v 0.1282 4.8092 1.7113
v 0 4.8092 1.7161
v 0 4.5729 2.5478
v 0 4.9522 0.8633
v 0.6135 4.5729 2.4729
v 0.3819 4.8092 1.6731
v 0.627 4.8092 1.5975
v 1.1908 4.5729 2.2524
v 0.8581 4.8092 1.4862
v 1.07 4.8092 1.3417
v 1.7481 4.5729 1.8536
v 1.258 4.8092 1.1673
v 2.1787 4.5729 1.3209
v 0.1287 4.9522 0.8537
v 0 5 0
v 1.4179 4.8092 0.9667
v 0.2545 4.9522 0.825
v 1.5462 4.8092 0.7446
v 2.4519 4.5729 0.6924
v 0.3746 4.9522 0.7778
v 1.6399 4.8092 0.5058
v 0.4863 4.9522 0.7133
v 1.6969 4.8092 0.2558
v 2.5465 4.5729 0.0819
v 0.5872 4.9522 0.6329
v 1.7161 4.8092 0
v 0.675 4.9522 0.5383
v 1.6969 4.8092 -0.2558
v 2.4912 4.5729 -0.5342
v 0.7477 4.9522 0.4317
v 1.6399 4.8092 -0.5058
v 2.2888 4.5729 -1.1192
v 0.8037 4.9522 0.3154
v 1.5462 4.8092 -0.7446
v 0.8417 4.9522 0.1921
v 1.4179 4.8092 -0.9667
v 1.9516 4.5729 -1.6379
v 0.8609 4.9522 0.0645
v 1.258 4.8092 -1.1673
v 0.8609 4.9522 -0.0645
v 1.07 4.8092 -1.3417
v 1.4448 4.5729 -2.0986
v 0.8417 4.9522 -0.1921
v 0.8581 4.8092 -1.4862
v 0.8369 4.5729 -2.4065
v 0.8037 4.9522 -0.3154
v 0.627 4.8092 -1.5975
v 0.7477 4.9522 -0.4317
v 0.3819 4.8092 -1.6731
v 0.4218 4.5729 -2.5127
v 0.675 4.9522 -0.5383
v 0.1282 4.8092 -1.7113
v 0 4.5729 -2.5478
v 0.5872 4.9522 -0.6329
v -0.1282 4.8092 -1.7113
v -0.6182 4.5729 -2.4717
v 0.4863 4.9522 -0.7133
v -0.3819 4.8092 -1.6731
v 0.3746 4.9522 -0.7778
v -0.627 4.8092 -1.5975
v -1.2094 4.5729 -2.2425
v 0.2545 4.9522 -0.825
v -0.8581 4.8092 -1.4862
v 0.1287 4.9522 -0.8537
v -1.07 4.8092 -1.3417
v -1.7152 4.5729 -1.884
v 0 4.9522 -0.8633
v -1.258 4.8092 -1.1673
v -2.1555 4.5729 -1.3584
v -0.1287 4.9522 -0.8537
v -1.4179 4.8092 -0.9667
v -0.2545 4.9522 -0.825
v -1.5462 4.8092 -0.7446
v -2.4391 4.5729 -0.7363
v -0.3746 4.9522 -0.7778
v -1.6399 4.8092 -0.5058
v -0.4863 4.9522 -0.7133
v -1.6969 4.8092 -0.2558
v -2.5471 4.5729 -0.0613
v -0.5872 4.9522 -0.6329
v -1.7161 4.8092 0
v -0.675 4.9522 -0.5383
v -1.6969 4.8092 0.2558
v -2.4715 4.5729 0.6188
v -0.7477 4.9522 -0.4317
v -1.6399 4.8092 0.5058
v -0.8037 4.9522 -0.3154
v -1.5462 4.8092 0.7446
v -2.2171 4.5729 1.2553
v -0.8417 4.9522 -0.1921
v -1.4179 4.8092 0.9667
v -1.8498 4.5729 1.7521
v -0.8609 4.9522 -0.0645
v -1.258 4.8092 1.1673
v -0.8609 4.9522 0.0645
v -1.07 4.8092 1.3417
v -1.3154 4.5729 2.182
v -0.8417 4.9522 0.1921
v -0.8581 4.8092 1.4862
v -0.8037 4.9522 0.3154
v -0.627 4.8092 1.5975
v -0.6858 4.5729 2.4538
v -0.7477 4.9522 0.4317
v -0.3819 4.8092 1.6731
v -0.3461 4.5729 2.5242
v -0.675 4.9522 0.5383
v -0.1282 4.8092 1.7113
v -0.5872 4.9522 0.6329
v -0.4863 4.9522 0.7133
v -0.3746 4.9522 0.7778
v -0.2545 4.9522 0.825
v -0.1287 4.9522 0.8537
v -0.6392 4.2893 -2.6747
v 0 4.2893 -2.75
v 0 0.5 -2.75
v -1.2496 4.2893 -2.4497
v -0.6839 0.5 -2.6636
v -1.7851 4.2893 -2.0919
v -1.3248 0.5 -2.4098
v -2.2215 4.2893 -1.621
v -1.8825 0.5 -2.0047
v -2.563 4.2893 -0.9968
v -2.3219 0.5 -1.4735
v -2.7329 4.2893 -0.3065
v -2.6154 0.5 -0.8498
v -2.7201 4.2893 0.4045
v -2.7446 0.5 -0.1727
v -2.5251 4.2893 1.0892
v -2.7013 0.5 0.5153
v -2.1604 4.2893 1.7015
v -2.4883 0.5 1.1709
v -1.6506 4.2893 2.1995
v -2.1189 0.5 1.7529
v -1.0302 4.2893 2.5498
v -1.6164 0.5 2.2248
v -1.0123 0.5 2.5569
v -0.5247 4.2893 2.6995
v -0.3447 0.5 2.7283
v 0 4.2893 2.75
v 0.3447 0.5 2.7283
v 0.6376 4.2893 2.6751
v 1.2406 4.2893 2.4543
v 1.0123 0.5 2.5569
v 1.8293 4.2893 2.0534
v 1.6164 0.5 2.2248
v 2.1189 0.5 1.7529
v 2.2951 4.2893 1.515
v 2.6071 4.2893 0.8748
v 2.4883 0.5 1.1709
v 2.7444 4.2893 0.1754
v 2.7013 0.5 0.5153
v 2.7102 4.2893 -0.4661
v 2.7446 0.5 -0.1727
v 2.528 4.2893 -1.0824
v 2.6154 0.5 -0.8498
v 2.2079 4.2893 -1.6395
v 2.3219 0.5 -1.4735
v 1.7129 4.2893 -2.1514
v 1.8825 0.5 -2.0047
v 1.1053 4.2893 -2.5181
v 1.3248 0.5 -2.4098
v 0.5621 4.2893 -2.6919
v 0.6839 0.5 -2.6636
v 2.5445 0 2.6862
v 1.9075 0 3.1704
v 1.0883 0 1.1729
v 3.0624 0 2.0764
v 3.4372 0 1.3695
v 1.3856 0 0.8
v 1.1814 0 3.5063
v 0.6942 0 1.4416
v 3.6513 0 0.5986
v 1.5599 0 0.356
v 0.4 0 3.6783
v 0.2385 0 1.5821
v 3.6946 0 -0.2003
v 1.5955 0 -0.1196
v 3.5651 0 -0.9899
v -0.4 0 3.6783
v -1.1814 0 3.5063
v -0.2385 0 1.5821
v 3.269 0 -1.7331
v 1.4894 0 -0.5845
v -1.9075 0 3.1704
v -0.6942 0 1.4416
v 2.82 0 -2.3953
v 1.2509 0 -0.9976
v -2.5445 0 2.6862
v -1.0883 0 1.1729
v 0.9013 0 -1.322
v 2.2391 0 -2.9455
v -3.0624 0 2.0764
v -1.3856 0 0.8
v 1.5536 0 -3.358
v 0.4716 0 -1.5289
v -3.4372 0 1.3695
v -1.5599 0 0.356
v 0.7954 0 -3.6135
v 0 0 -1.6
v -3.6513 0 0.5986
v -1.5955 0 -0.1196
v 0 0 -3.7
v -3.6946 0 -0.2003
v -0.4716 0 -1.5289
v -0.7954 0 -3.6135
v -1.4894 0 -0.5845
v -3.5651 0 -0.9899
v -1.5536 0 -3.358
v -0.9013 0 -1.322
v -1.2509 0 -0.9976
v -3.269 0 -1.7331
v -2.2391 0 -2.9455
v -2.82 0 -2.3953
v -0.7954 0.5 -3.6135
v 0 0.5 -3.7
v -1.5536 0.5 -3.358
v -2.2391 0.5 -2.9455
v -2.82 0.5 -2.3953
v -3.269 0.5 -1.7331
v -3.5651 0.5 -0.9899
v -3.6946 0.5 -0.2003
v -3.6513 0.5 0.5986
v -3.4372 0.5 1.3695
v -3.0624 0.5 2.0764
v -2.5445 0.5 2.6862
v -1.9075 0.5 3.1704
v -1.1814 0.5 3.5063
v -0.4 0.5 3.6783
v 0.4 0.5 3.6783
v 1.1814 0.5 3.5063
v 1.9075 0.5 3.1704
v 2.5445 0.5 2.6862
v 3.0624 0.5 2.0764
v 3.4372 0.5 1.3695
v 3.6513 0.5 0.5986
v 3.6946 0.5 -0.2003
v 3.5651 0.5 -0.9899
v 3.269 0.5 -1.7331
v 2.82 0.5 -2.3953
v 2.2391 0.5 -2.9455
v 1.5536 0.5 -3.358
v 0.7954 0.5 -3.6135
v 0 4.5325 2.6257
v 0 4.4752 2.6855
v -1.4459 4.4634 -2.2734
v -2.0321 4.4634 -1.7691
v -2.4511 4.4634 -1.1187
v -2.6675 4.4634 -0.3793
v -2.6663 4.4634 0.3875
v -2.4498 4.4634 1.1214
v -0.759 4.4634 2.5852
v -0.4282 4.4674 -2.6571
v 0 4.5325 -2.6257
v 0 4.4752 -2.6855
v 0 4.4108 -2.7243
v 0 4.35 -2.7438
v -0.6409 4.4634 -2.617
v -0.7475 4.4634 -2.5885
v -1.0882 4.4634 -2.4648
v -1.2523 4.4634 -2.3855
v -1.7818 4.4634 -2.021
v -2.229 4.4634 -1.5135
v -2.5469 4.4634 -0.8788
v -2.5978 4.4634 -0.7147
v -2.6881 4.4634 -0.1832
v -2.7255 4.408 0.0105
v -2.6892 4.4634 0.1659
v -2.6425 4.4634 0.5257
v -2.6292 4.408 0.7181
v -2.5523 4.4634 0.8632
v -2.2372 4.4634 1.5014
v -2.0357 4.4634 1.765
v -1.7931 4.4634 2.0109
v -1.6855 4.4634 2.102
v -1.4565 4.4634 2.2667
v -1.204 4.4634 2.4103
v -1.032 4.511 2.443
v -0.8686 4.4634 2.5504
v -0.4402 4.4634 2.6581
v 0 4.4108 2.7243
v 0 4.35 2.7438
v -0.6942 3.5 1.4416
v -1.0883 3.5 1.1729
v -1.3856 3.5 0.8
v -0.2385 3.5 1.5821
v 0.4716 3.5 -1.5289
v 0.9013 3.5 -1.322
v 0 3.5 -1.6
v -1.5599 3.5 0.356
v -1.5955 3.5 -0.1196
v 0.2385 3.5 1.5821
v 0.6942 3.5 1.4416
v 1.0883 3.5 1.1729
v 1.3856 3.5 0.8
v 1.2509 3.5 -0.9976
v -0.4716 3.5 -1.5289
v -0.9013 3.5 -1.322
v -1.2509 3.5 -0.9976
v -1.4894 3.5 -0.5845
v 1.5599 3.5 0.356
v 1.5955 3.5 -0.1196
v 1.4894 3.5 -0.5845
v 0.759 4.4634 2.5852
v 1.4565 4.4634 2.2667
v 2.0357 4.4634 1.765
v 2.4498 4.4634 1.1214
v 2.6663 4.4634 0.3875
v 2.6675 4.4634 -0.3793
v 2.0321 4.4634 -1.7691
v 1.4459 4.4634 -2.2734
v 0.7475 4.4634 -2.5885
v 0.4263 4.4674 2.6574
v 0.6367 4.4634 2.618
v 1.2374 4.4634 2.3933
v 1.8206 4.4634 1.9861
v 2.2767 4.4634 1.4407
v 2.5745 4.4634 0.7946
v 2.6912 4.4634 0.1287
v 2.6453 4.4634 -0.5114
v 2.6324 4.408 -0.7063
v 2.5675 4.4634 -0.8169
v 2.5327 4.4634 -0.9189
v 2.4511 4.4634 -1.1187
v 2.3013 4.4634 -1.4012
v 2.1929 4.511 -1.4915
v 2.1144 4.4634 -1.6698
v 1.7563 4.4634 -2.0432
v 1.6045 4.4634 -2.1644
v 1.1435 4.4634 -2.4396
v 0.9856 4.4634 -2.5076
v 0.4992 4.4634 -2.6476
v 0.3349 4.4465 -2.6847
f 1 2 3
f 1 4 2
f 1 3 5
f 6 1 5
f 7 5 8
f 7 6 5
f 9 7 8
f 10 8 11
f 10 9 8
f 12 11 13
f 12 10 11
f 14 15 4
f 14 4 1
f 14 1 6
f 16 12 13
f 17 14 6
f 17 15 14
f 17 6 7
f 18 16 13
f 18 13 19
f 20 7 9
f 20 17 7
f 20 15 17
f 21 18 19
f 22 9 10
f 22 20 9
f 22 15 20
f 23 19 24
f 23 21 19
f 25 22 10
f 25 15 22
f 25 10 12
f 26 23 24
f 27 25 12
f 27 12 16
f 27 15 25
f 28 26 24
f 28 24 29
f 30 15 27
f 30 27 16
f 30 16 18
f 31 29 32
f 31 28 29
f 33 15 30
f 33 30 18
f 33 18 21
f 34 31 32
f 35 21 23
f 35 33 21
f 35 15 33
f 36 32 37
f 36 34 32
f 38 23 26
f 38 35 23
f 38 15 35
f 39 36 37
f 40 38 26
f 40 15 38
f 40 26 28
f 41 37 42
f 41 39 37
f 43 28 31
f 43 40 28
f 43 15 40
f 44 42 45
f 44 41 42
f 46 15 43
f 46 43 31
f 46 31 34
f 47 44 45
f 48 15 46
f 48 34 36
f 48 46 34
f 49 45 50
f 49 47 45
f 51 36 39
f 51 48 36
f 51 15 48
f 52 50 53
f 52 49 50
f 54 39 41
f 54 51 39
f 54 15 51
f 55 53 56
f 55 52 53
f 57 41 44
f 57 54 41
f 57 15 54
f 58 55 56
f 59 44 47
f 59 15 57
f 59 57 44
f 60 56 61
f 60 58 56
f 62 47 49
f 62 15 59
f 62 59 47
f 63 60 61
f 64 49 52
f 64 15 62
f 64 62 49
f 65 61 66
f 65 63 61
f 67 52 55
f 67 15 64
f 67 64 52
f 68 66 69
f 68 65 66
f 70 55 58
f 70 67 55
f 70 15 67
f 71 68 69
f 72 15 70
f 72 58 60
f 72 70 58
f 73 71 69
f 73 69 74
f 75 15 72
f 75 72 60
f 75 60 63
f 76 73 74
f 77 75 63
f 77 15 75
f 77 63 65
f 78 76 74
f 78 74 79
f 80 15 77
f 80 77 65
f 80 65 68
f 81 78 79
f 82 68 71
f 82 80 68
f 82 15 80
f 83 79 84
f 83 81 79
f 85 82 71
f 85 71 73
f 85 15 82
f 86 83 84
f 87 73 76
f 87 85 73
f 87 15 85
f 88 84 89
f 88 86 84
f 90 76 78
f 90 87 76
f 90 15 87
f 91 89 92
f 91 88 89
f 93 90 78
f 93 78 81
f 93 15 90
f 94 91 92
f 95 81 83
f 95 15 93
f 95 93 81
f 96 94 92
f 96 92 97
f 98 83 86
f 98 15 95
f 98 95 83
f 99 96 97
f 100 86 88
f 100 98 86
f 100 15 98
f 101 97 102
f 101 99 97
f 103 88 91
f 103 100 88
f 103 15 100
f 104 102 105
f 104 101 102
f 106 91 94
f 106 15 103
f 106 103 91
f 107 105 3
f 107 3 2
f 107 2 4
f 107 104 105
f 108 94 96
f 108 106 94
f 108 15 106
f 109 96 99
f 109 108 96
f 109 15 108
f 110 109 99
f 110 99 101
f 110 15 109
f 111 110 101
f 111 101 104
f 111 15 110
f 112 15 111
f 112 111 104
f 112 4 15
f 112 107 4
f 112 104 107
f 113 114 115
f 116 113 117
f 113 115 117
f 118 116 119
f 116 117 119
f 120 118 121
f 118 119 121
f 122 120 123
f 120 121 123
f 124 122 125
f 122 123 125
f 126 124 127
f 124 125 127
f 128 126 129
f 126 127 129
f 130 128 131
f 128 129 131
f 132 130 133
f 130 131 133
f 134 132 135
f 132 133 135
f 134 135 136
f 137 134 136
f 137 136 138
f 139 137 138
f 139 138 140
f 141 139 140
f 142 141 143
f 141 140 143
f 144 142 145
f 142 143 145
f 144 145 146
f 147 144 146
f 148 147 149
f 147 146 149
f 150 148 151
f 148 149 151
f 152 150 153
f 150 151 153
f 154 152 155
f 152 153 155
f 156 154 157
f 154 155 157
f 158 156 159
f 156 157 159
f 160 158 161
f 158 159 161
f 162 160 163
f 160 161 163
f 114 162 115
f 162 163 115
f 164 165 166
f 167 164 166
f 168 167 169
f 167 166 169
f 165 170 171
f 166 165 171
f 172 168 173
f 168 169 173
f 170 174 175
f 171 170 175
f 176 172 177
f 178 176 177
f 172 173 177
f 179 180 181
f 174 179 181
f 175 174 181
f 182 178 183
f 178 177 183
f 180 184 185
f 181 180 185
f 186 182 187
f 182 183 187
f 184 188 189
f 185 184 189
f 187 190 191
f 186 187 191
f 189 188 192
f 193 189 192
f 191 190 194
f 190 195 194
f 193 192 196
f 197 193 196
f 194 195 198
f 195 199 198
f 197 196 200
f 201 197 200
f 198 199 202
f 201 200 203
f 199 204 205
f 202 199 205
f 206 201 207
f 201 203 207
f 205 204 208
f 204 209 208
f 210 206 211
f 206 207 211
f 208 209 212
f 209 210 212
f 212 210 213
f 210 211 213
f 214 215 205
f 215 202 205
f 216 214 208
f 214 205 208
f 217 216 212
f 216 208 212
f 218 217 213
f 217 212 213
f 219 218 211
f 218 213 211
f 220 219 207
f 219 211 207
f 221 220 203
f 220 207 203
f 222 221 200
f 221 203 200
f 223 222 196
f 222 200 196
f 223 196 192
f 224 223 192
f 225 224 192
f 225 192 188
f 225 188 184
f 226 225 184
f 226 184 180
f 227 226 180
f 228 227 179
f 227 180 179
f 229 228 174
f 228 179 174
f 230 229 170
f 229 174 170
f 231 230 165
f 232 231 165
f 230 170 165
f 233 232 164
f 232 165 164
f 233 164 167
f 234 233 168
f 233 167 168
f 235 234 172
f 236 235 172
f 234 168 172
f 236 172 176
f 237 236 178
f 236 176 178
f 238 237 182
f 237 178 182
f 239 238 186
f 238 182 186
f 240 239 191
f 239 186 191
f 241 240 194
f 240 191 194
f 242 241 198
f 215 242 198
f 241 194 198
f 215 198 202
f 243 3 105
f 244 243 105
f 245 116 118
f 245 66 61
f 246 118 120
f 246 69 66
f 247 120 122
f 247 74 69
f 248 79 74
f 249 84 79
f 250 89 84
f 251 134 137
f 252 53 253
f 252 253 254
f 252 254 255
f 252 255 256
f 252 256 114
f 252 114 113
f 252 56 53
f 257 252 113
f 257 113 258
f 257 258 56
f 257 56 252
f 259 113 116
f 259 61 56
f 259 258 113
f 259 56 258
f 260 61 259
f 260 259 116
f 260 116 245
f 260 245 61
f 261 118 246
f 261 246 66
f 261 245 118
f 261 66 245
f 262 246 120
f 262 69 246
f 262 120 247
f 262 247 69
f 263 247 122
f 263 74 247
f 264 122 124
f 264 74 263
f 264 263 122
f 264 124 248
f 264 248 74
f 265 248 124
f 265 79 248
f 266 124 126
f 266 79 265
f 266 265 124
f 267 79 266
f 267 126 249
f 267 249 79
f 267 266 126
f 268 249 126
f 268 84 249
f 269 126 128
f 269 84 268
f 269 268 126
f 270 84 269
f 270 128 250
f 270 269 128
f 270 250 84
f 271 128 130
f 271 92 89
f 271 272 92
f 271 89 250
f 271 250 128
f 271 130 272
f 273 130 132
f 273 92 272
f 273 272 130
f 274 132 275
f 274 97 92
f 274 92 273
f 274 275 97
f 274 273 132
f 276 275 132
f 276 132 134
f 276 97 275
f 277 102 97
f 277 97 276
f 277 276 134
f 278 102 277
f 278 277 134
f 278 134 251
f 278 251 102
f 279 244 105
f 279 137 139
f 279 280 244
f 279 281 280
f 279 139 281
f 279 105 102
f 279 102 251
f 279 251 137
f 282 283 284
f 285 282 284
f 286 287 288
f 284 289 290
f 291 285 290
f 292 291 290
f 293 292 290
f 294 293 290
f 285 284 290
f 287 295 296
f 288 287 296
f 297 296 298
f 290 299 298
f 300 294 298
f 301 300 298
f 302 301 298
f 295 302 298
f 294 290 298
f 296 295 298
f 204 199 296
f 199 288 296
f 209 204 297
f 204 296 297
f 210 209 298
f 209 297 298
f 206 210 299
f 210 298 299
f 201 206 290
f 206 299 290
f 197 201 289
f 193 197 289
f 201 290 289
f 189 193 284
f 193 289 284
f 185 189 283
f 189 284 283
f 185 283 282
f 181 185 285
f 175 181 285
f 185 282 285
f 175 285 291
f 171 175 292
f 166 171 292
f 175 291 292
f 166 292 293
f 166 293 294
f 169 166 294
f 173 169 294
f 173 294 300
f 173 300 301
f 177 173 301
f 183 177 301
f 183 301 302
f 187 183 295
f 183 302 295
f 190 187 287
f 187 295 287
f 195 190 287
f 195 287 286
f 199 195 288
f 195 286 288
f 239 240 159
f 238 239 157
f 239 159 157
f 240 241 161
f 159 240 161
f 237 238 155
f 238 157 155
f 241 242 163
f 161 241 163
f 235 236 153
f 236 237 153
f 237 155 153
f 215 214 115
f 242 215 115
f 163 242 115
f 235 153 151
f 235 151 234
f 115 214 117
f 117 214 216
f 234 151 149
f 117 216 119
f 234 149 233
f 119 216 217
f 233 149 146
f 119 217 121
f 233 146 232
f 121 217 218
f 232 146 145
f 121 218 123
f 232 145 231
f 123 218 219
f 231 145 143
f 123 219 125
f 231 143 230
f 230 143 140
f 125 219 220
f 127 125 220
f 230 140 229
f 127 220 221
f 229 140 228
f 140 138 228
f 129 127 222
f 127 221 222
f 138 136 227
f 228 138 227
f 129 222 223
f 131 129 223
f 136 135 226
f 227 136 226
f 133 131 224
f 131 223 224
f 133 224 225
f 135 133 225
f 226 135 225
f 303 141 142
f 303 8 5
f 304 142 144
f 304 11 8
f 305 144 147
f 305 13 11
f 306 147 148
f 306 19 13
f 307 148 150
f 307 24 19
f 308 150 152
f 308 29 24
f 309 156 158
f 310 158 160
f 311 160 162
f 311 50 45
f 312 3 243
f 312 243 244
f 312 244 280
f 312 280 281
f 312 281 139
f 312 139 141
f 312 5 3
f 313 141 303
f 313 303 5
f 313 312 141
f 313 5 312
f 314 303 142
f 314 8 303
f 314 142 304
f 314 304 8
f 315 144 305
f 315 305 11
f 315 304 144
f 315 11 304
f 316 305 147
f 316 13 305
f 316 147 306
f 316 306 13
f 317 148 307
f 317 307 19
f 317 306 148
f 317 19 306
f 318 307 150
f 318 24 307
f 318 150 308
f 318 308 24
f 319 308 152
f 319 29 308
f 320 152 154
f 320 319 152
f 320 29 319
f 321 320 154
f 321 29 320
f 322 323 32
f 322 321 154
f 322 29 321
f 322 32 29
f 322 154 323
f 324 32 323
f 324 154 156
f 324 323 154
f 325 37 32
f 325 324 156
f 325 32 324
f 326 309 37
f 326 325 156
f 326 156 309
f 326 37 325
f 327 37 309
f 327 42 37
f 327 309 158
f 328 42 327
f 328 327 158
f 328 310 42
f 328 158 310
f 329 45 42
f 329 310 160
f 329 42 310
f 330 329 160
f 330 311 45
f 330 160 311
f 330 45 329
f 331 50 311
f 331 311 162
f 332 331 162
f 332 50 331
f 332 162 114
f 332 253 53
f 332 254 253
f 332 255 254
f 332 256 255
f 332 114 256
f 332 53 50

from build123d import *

# Parameters (mm, degrees)
DOME_2_FACE_RADIUS = 2.75
DOME_2_HEIGHT      = 0.5
FILLET_1_R         = 0.3


with BuildPart() as part:
    # 草图1 → 旋转2 (revolve)
    with BuildSketch(Plane.XY, mode=Mode.PRIVATE) as revolve_2_sk:
        Polygon((-3.7, 0), (-1.6, 0), (-1.6, 3.5), (0, 3.5), (0, 4.5), (-2.75, 4.5), (-2.75, 0.5), (-3.7, 0.5), align=None)
    revolve(revolve_2_sk.sketch.rotate(Axis((0, -1.216580074, 0), (0, 1, 0)), 270), axis=Axis((0, -1.216580074, 0), (0, 1, 0)))

    # 圆顶2: a dome of height H over a round flat face of radius A is a cap of a sphere of radius (A * A + H * H) / (2 * H)
    dome_2_r = (DOME_2_FACE_RADIUS * DOME_2_FACE_RADIUS + DOME_2_HEIGHT * DOME_2_HEIGHT) / (2 * DOME_2_HEIGHT)
    dome_2_base = Plane((0, 4.5, 0), z_dir=(0, 1, 0))
    with Locations(dome_2_base.offset(DOME_2_HEIGHT - dome_2_r)):
        dome_2_ball = Sphere(dome_2_r, mode=Mode.PRIVATE)
    add(split(dome_2_ball, bisect_by=dome_2_base, keep=Keep.TOP, mode=Mode.PRIVATE))

    # 圆角1
    fillet_1_edges = [part.edges().sort_by_distance(p)[0] for p in [
        (2.75, 4.5, 0),
    ]]
    fillet(fillet_1_edges, radius=FILLET_1_R)


solid = part.part
